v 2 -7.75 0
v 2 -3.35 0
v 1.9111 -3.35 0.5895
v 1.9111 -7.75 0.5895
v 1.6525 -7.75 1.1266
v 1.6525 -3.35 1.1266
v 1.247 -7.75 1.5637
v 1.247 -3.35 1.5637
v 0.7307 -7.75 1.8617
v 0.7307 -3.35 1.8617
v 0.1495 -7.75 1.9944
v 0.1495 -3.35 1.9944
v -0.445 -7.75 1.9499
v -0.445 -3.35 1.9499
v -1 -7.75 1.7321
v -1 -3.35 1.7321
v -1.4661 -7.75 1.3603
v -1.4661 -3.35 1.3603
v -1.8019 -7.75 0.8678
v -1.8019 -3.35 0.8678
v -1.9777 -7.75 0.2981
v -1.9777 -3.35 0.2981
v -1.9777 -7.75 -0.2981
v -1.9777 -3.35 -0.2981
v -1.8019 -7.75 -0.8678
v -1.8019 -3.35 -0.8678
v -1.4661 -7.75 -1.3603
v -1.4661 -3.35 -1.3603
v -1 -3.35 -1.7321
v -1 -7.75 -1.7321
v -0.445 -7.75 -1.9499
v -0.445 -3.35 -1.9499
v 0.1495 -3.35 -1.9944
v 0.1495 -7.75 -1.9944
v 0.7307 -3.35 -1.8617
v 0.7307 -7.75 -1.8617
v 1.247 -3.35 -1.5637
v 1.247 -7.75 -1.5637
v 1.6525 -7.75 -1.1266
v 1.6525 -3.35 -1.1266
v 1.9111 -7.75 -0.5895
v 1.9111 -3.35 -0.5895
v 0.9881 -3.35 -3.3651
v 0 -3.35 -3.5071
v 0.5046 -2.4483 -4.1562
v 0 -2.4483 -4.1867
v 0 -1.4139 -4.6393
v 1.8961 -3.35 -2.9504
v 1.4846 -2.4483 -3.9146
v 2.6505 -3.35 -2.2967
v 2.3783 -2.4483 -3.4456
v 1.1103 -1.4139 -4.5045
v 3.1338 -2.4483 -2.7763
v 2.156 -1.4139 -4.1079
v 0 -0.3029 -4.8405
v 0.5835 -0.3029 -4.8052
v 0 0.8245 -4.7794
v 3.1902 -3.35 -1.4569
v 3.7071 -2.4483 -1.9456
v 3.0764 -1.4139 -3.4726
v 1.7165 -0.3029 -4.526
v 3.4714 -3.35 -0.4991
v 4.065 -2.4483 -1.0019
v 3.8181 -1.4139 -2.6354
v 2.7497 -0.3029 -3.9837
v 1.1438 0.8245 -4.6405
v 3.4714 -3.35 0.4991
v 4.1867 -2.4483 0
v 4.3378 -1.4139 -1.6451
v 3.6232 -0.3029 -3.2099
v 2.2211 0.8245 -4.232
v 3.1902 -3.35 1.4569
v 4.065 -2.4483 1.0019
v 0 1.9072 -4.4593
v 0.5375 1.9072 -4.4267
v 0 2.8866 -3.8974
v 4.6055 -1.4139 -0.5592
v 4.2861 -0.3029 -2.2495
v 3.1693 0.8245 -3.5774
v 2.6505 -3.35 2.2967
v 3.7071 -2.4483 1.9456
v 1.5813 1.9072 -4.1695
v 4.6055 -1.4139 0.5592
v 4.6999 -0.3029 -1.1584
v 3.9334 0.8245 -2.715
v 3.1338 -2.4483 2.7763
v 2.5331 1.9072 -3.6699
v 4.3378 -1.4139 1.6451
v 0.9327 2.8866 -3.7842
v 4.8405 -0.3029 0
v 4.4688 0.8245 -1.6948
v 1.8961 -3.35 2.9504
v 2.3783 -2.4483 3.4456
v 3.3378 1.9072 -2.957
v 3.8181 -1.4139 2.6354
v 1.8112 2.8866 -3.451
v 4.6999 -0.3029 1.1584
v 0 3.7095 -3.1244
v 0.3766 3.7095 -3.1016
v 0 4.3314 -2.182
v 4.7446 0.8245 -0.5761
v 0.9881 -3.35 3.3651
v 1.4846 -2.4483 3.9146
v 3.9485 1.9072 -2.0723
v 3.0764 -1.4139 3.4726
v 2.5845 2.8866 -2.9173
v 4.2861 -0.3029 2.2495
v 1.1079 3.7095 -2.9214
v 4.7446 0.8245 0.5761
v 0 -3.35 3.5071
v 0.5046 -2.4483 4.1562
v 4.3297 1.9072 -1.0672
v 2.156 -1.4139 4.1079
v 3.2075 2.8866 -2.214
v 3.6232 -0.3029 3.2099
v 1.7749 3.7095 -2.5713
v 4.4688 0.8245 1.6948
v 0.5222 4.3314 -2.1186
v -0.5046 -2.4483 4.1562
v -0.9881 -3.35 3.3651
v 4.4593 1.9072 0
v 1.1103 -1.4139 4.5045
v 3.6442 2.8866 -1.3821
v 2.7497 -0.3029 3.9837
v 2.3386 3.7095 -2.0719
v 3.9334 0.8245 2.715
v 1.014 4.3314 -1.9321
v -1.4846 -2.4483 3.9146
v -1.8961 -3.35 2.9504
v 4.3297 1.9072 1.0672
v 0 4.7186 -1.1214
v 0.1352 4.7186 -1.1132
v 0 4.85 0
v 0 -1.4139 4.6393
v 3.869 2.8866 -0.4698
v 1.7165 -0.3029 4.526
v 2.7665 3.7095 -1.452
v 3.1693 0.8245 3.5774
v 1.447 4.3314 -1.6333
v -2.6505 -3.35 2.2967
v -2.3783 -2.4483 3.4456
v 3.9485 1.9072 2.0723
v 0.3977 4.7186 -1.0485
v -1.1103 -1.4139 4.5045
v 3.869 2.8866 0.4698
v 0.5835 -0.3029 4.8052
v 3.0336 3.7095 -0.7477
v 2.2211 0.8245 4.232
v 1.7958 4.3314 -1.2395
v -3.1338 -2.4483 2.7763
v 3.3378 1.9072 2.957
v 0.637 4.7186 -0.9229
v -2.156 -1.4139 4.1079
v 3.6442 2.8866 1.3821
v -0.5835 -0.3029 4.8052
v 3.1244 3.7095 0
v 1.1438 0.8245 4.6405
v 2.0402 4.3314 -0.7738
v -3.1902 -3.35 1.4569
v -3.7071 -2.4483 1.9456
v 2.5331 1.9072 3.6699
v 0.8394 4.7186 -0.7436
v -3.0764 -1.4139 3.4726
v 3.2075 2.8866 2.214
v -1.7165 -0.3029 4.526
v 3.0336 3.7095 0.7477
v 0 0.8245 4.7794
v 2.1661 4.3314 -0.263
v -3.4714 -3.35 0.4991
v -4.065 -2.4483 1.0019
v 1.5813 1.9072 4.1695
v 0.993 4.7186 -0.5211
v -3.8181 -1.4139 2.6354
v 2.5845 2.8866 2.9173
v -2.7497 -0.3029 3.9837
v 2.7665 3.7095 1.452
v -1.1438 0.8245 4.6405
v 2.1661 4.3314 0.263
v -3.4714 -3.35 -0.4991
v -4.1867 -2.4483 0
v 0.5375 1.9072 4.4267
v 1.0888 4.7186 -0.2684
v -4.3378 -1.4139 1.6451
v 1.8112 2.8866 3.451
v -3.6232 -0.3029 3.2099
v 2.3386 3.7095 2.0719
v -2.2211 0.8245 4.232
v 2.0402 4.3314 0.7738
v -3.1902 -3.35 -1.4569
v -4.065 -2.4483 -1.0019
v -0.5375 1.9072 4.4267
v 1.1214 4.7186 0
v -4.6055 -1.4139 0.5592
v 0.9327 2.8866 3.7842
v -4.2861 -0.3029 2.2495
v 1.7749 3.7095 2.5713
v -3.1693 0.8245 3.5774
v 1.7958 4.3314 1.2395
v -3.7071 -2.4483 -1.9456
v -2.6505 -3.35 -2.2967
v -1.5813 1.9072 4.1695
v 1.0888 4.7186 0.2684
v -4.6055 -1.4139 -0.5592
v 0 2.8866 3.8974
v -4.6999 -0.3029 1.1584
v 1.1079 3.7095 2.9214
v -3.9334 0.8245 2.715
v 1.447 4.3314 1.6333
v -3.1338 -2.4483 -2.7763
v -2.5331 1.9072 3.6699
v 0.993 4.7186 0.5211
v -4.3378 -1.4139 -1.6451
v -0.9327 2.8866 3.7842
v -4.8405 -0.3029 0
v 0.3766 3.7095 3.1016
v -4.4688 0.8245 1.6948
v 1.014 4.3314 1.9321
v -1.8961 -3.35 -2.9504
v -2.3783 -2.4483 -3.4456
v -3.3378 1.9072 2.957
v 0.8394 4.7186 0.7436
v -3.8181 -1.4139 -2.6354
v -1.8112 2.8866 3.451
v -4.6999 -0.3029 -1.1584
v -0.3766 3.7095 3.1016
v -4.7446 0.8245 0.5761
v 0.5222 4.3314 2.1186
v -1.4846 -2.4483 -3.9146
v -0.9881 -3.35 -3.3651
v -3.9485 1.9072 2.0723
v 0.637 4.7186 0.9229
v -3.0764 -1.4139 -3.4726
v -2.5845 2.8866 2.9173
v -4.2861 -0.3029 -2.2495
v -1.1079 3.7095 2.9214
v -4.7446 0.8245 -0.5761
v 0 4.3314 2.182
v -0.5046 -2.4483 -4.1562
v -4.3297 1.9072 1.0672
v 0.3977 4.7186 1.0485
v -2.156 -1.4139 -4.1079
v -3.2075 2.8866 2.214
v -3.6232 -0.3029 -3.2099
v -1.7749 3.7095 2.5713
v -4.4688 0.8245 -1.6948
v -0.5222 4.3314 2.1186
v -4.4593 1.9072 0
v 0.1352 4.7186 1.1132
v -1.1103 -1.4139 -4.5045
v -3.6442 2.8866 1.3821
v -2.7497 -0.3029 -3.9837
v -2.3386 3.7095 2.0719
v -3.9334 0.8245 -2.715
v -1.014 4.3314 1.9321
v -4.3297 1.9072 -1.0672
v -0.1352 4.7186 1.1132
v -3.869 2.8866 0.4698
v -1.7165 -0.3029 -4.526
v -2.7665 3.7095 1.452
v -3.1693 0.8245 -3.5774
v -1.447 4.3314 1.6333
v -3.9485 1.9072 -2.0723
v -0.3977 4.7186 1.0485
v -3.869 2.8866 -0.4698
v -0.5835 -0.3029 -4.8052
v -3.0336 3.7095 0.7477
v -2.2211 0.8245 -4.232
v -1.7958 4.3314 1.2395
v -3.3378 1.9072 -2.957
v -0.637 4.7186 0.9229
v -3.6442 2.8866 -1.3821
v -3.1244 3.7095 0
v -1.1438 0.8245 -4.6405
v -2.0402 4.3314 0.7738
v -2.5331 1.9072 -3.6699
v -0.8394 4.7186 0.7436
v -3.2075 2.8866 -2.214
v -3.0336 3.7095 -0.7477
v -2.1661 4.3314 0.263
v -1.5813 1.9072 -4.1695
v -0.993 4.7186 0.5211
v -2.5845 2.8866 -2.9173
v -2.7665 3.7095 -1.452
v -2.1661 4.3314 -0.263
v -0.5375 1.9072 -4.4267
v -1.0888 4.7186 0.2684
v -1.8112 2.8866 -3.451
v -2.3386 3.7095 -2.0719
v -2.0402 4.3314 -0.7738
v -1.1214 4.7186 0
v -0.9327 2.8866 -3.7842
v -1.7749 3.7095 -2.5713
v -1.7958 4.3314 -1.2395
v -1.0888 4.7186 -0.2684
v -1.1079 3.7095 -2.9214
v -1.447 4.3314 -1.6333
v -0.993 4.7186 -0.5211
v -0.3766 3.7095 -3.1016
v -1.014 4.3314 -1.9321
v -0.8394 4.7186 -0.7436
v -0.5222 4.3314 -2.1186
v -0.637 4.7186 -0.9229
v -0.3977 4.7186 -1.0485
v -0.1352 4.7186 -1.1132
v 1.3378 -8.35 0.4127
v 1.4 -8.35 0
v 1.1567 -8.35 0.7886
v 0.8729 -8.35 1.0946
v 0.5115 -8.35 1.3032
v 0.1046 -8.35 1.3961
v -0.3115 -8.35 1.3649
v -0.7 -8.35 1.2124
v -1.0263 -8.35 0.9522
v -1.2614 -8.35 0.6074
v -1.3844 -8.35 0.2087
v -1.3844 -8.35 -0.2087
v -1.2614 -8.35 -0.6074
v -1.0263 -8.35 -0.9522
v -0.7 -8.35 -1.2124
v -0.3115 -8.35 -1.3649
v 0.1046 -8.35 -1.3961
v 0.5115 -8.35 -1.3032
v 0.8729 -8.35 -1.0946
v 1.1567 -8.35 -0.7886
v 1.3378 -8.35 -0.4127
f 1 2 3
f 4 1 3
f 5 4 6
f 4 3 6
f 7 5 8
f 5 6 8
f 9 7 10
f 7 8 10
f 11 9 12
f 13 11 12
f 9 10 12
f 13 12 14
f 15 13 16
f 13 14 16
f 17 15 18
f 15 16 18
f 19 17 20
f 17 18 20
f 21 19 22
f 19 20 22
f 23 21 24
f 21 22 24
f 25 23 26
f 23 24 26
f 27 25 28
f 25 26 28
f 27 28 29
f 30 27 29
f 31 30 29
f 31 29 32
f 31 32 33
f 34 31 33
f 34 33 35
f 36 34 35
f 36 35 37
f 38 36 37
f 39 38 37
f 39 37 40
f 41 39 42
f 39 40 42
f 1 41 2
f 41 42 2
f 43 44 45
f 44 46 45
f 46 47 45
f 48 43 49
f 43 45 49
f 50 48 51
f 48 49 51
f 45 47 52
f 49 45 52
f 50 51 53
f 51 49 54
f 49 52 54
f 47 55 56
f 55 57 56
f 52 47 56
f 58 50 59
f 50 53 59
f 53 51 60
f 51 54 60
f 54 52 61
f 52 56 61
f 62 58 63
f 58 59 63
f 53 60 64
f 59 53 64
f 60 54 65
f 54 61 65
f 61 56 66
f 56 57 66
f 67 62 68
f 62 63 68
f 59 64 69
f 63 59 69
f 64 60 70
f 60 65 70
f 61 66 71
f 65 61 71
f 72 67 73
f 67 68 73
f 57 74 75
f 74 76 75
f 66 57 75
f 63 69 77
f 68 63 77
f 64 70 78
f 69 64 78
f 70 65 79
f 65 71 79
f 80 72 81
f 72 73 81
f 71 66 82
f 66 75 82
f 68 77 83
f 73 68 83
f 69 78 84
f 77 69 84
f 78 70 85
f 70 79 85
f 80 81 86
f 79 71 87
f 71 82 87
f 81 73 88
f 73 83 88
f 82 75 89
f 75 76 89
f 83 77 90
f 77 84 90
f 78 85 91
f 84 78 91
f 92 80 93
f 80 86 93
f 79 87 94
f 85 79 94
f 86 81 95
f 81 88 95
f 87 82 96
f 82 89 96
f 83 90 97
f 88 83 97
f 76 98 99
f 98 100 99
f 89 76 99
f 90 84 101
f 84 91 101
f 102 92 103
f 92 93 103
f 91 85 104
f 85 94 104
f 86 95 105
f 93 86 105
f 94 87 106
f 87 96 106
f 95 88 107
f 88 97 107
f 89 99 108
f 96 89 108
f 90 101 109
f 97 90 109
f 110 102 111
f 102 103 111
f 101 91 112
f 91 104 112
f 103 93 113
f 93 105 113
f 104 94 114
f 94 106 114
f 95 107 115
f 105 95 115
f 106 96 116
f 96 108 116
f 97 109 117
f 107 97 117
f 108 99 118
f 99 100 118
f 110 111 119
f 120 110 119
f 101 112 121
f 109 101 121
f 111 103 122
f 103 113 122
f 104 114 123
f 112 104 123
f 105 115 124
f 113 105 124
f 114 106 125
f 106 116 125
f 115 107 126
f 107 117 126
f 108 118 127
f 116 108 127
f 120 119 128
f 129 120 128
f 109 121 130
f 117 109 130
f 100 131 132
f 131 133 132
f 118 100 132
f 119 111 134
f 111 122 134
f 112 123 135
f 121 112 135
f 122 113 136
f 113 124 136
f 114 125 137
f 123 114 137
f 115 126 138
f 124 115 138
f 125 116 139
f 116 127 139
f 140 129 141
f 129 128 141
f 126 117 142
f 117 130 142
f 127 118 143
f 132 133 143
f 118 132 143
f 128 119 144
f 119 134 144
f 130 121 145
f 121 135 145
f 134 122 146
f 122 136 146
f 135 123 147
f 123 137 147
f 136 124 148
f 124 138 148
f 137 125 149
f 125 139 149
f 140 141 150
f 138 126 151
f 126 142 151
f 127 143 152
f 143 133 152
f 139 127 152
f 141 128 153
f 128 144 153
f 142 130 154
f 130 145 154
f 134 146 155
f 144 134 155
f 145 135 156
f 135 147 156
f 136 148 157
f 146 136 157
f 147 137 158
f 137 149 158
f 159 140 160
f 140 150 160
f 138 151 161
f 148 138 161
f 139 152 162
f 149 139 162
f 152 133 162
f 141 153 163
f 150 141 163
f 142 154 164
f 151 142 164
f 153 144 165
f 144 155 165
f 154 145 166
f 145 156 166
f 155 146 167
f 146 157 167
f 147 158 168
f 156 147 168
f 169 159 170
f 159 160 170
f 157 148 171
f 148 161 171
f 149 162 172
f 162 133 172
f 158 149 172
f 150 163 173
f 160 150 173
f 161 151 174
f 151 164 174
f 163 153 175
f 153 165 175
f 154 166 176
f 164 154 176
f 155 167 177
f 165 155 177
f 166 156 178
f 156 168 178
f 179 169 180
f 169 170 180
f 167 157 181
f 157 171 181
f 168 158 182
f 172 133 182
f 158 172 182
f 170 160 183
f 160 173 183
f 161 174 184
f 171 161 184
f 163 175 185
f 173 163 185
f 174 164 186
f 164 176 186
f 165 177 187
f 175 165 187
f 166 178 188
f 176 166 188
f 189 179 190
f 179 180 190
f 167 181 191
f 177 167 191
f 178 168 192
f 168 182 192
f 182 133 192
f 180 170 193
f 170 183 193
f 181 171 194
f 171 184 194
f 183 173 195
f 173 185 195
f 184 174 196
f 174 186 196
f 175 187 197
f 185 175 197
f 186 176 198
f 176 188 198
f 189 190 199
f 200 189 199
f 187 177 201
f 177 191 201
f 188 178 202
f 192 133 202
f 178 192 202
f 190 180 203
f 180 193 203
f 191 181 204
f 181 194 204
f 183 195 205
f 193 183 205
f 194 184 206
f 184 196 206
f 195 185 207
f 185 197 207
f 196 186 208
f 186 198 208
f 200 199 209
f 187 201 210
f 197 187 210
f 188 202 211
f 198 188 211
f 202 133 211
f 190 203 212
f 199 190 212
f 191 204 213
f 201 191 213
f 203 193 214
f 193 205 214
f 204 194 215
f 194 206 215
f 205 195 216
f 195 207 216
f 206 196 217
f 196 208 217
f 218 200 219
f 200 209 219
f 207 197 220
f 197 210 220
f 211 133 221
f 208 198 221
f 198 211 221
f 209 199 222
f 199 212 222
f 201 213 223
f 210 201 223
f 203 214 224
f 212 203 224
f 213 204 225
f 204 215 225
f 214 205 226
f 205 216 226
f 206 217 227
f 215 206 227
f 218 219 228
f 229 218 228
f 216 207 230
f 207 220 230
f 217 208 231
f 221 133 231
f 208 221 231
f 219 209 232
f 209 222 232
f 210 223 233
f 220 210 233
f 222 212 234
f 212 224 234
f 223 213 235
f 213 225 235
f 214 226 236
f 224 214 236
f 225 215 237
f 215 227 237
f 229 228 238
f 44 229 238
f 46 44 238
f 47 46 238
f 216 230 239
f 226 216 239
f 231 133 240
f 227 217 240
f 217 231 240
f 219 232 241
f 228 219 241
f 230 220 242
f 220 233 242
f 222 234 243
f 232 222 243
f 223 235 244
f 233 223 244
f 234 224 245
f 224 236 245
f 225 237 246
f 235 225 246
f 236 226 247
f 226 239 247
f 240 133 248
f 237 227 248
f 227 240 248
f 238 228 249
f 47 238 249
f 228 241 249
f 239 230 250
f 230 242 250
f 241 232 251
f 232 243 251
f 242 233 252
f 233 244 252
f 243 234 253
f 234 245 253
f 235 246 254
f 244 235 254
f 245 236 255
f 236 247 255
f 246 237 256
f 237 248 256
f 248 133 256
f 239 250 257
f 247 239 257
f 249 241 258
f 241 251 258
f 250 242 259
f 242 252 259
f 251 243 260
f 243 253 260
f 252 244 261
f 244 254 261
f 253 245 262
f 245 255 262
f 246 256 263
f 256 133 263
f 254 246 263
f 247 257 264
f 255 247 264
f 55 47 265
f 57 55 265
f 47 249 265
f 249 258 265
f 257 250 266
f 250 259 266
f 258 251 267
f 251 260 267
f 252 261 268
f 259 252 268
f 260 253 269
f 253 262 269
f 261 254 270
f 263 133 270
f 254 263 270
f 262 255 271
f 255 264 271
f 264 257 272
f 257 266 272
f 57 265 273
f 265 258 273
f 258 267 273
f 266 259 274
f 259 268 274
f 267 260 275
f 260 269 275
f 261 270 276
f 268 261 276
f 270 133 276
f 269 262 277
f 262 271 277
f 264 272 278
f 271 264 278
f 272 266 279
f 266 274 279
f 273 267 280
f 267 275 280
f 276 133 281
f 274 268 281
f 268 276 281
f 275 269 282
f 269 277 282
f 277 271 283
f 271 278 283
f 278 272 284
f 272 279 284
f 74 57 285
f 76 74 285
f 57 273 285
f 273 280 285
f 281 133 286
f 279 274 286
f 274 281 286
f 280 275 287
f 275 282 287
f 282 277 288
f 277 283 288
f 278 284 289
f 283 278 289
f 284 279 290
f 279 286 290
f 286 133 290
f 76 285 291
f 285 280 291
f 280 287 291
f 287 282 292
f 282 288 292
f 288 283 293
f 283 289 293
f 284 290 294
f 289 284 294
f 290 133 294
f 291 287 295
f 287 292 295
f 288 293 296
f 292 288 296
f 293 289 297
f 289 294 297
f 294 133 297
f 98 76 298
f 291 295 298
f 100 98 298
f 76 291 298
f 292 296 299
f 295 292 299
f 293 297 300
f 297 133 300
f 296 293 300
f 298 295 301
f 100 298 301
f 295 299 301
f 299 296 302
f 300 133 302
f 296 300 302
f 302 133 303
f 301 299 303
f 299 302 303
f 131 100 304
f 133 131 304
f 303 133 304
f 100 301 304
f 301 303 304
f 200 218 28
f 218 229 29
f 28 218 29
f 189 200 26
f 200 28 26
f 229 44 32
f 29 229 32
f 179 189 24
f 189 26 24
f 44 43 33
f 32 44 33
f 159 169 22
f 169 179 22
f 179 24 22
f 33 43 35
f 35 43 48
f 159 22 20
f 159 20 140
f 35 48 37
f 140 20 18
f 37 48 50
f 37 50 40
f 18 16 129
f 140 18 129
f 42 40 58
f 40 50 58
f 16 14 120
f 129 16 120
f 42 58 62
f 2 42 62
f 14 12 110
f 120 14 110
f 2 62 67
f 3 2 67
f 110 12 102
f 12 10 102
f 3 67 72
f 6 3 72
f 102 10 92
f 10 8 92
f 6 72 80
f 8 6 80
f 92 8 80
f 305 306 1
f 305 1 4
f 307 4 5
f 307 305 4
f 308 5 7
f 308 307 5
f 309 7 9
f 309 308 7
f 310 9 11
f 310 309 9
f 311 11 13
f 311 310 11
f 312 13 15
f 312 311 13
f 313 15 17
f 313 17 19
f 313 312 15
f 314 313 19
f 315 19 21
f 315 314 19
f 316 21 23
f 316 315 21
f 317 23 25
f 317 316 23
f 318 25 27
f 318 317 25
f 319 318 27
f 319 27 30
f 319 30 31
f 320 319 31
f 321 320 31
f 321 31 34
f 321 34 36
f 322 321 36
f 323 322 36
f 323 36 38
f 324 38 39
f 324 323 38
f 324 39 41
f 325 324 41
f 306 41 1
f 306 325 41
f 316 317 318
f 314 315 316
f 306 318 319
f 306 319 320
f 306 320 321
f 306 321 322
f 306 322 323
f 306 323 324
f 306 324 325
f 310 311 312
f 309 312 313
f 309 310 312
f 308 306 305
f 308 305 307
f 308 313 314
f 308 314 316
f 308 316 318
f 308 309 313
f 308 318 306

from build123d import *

# Parameters (mm, degrees)
SKIZZE2_R                       = 2
AUFSATZ_LINEAR_AUSTRAGEN1_DEPTH = 5
FASE1_SIZE                      = 0.6


with BuildPart() as part:
    # Skizze1 → Rotation1 (revolve)
    with BuildSketch(Plane(origin=(0, 0, 0), x_dir=(0, 0, -1), z_dir=(1, 0, 0))):
        with BuildLine():
            Line((0, 4.85), (0, -3.35))
            Line((0, -3.35), (3.507135583, -3.35))
            ThreePointArc((3.507135583, -3.35), (4.459260028, 1.907223112), (0, 4.85))
        make_face()
    revolve(axis=Axis((0, 21.112600536, 0), (0, -1, 0)))

    # Skizze2 → Aufsatz-Linear austragen1 (add)
    with BuildSketch(Plane.XZ.offset(3.35)):
        Circle(SKIZZE2_R)
    extrude(amount=AUFSATZ_LINEAR_AUSTRAGEN1_DEPTH)

    # Fase1
    fase1_edges = [part.edges().sort_by_distance(p)[0] for p in [
        (-2, -8.35, 0),
    ]]
    chamfer(fase1_edges, length=FASE1_SIZE)


solid = part.part
